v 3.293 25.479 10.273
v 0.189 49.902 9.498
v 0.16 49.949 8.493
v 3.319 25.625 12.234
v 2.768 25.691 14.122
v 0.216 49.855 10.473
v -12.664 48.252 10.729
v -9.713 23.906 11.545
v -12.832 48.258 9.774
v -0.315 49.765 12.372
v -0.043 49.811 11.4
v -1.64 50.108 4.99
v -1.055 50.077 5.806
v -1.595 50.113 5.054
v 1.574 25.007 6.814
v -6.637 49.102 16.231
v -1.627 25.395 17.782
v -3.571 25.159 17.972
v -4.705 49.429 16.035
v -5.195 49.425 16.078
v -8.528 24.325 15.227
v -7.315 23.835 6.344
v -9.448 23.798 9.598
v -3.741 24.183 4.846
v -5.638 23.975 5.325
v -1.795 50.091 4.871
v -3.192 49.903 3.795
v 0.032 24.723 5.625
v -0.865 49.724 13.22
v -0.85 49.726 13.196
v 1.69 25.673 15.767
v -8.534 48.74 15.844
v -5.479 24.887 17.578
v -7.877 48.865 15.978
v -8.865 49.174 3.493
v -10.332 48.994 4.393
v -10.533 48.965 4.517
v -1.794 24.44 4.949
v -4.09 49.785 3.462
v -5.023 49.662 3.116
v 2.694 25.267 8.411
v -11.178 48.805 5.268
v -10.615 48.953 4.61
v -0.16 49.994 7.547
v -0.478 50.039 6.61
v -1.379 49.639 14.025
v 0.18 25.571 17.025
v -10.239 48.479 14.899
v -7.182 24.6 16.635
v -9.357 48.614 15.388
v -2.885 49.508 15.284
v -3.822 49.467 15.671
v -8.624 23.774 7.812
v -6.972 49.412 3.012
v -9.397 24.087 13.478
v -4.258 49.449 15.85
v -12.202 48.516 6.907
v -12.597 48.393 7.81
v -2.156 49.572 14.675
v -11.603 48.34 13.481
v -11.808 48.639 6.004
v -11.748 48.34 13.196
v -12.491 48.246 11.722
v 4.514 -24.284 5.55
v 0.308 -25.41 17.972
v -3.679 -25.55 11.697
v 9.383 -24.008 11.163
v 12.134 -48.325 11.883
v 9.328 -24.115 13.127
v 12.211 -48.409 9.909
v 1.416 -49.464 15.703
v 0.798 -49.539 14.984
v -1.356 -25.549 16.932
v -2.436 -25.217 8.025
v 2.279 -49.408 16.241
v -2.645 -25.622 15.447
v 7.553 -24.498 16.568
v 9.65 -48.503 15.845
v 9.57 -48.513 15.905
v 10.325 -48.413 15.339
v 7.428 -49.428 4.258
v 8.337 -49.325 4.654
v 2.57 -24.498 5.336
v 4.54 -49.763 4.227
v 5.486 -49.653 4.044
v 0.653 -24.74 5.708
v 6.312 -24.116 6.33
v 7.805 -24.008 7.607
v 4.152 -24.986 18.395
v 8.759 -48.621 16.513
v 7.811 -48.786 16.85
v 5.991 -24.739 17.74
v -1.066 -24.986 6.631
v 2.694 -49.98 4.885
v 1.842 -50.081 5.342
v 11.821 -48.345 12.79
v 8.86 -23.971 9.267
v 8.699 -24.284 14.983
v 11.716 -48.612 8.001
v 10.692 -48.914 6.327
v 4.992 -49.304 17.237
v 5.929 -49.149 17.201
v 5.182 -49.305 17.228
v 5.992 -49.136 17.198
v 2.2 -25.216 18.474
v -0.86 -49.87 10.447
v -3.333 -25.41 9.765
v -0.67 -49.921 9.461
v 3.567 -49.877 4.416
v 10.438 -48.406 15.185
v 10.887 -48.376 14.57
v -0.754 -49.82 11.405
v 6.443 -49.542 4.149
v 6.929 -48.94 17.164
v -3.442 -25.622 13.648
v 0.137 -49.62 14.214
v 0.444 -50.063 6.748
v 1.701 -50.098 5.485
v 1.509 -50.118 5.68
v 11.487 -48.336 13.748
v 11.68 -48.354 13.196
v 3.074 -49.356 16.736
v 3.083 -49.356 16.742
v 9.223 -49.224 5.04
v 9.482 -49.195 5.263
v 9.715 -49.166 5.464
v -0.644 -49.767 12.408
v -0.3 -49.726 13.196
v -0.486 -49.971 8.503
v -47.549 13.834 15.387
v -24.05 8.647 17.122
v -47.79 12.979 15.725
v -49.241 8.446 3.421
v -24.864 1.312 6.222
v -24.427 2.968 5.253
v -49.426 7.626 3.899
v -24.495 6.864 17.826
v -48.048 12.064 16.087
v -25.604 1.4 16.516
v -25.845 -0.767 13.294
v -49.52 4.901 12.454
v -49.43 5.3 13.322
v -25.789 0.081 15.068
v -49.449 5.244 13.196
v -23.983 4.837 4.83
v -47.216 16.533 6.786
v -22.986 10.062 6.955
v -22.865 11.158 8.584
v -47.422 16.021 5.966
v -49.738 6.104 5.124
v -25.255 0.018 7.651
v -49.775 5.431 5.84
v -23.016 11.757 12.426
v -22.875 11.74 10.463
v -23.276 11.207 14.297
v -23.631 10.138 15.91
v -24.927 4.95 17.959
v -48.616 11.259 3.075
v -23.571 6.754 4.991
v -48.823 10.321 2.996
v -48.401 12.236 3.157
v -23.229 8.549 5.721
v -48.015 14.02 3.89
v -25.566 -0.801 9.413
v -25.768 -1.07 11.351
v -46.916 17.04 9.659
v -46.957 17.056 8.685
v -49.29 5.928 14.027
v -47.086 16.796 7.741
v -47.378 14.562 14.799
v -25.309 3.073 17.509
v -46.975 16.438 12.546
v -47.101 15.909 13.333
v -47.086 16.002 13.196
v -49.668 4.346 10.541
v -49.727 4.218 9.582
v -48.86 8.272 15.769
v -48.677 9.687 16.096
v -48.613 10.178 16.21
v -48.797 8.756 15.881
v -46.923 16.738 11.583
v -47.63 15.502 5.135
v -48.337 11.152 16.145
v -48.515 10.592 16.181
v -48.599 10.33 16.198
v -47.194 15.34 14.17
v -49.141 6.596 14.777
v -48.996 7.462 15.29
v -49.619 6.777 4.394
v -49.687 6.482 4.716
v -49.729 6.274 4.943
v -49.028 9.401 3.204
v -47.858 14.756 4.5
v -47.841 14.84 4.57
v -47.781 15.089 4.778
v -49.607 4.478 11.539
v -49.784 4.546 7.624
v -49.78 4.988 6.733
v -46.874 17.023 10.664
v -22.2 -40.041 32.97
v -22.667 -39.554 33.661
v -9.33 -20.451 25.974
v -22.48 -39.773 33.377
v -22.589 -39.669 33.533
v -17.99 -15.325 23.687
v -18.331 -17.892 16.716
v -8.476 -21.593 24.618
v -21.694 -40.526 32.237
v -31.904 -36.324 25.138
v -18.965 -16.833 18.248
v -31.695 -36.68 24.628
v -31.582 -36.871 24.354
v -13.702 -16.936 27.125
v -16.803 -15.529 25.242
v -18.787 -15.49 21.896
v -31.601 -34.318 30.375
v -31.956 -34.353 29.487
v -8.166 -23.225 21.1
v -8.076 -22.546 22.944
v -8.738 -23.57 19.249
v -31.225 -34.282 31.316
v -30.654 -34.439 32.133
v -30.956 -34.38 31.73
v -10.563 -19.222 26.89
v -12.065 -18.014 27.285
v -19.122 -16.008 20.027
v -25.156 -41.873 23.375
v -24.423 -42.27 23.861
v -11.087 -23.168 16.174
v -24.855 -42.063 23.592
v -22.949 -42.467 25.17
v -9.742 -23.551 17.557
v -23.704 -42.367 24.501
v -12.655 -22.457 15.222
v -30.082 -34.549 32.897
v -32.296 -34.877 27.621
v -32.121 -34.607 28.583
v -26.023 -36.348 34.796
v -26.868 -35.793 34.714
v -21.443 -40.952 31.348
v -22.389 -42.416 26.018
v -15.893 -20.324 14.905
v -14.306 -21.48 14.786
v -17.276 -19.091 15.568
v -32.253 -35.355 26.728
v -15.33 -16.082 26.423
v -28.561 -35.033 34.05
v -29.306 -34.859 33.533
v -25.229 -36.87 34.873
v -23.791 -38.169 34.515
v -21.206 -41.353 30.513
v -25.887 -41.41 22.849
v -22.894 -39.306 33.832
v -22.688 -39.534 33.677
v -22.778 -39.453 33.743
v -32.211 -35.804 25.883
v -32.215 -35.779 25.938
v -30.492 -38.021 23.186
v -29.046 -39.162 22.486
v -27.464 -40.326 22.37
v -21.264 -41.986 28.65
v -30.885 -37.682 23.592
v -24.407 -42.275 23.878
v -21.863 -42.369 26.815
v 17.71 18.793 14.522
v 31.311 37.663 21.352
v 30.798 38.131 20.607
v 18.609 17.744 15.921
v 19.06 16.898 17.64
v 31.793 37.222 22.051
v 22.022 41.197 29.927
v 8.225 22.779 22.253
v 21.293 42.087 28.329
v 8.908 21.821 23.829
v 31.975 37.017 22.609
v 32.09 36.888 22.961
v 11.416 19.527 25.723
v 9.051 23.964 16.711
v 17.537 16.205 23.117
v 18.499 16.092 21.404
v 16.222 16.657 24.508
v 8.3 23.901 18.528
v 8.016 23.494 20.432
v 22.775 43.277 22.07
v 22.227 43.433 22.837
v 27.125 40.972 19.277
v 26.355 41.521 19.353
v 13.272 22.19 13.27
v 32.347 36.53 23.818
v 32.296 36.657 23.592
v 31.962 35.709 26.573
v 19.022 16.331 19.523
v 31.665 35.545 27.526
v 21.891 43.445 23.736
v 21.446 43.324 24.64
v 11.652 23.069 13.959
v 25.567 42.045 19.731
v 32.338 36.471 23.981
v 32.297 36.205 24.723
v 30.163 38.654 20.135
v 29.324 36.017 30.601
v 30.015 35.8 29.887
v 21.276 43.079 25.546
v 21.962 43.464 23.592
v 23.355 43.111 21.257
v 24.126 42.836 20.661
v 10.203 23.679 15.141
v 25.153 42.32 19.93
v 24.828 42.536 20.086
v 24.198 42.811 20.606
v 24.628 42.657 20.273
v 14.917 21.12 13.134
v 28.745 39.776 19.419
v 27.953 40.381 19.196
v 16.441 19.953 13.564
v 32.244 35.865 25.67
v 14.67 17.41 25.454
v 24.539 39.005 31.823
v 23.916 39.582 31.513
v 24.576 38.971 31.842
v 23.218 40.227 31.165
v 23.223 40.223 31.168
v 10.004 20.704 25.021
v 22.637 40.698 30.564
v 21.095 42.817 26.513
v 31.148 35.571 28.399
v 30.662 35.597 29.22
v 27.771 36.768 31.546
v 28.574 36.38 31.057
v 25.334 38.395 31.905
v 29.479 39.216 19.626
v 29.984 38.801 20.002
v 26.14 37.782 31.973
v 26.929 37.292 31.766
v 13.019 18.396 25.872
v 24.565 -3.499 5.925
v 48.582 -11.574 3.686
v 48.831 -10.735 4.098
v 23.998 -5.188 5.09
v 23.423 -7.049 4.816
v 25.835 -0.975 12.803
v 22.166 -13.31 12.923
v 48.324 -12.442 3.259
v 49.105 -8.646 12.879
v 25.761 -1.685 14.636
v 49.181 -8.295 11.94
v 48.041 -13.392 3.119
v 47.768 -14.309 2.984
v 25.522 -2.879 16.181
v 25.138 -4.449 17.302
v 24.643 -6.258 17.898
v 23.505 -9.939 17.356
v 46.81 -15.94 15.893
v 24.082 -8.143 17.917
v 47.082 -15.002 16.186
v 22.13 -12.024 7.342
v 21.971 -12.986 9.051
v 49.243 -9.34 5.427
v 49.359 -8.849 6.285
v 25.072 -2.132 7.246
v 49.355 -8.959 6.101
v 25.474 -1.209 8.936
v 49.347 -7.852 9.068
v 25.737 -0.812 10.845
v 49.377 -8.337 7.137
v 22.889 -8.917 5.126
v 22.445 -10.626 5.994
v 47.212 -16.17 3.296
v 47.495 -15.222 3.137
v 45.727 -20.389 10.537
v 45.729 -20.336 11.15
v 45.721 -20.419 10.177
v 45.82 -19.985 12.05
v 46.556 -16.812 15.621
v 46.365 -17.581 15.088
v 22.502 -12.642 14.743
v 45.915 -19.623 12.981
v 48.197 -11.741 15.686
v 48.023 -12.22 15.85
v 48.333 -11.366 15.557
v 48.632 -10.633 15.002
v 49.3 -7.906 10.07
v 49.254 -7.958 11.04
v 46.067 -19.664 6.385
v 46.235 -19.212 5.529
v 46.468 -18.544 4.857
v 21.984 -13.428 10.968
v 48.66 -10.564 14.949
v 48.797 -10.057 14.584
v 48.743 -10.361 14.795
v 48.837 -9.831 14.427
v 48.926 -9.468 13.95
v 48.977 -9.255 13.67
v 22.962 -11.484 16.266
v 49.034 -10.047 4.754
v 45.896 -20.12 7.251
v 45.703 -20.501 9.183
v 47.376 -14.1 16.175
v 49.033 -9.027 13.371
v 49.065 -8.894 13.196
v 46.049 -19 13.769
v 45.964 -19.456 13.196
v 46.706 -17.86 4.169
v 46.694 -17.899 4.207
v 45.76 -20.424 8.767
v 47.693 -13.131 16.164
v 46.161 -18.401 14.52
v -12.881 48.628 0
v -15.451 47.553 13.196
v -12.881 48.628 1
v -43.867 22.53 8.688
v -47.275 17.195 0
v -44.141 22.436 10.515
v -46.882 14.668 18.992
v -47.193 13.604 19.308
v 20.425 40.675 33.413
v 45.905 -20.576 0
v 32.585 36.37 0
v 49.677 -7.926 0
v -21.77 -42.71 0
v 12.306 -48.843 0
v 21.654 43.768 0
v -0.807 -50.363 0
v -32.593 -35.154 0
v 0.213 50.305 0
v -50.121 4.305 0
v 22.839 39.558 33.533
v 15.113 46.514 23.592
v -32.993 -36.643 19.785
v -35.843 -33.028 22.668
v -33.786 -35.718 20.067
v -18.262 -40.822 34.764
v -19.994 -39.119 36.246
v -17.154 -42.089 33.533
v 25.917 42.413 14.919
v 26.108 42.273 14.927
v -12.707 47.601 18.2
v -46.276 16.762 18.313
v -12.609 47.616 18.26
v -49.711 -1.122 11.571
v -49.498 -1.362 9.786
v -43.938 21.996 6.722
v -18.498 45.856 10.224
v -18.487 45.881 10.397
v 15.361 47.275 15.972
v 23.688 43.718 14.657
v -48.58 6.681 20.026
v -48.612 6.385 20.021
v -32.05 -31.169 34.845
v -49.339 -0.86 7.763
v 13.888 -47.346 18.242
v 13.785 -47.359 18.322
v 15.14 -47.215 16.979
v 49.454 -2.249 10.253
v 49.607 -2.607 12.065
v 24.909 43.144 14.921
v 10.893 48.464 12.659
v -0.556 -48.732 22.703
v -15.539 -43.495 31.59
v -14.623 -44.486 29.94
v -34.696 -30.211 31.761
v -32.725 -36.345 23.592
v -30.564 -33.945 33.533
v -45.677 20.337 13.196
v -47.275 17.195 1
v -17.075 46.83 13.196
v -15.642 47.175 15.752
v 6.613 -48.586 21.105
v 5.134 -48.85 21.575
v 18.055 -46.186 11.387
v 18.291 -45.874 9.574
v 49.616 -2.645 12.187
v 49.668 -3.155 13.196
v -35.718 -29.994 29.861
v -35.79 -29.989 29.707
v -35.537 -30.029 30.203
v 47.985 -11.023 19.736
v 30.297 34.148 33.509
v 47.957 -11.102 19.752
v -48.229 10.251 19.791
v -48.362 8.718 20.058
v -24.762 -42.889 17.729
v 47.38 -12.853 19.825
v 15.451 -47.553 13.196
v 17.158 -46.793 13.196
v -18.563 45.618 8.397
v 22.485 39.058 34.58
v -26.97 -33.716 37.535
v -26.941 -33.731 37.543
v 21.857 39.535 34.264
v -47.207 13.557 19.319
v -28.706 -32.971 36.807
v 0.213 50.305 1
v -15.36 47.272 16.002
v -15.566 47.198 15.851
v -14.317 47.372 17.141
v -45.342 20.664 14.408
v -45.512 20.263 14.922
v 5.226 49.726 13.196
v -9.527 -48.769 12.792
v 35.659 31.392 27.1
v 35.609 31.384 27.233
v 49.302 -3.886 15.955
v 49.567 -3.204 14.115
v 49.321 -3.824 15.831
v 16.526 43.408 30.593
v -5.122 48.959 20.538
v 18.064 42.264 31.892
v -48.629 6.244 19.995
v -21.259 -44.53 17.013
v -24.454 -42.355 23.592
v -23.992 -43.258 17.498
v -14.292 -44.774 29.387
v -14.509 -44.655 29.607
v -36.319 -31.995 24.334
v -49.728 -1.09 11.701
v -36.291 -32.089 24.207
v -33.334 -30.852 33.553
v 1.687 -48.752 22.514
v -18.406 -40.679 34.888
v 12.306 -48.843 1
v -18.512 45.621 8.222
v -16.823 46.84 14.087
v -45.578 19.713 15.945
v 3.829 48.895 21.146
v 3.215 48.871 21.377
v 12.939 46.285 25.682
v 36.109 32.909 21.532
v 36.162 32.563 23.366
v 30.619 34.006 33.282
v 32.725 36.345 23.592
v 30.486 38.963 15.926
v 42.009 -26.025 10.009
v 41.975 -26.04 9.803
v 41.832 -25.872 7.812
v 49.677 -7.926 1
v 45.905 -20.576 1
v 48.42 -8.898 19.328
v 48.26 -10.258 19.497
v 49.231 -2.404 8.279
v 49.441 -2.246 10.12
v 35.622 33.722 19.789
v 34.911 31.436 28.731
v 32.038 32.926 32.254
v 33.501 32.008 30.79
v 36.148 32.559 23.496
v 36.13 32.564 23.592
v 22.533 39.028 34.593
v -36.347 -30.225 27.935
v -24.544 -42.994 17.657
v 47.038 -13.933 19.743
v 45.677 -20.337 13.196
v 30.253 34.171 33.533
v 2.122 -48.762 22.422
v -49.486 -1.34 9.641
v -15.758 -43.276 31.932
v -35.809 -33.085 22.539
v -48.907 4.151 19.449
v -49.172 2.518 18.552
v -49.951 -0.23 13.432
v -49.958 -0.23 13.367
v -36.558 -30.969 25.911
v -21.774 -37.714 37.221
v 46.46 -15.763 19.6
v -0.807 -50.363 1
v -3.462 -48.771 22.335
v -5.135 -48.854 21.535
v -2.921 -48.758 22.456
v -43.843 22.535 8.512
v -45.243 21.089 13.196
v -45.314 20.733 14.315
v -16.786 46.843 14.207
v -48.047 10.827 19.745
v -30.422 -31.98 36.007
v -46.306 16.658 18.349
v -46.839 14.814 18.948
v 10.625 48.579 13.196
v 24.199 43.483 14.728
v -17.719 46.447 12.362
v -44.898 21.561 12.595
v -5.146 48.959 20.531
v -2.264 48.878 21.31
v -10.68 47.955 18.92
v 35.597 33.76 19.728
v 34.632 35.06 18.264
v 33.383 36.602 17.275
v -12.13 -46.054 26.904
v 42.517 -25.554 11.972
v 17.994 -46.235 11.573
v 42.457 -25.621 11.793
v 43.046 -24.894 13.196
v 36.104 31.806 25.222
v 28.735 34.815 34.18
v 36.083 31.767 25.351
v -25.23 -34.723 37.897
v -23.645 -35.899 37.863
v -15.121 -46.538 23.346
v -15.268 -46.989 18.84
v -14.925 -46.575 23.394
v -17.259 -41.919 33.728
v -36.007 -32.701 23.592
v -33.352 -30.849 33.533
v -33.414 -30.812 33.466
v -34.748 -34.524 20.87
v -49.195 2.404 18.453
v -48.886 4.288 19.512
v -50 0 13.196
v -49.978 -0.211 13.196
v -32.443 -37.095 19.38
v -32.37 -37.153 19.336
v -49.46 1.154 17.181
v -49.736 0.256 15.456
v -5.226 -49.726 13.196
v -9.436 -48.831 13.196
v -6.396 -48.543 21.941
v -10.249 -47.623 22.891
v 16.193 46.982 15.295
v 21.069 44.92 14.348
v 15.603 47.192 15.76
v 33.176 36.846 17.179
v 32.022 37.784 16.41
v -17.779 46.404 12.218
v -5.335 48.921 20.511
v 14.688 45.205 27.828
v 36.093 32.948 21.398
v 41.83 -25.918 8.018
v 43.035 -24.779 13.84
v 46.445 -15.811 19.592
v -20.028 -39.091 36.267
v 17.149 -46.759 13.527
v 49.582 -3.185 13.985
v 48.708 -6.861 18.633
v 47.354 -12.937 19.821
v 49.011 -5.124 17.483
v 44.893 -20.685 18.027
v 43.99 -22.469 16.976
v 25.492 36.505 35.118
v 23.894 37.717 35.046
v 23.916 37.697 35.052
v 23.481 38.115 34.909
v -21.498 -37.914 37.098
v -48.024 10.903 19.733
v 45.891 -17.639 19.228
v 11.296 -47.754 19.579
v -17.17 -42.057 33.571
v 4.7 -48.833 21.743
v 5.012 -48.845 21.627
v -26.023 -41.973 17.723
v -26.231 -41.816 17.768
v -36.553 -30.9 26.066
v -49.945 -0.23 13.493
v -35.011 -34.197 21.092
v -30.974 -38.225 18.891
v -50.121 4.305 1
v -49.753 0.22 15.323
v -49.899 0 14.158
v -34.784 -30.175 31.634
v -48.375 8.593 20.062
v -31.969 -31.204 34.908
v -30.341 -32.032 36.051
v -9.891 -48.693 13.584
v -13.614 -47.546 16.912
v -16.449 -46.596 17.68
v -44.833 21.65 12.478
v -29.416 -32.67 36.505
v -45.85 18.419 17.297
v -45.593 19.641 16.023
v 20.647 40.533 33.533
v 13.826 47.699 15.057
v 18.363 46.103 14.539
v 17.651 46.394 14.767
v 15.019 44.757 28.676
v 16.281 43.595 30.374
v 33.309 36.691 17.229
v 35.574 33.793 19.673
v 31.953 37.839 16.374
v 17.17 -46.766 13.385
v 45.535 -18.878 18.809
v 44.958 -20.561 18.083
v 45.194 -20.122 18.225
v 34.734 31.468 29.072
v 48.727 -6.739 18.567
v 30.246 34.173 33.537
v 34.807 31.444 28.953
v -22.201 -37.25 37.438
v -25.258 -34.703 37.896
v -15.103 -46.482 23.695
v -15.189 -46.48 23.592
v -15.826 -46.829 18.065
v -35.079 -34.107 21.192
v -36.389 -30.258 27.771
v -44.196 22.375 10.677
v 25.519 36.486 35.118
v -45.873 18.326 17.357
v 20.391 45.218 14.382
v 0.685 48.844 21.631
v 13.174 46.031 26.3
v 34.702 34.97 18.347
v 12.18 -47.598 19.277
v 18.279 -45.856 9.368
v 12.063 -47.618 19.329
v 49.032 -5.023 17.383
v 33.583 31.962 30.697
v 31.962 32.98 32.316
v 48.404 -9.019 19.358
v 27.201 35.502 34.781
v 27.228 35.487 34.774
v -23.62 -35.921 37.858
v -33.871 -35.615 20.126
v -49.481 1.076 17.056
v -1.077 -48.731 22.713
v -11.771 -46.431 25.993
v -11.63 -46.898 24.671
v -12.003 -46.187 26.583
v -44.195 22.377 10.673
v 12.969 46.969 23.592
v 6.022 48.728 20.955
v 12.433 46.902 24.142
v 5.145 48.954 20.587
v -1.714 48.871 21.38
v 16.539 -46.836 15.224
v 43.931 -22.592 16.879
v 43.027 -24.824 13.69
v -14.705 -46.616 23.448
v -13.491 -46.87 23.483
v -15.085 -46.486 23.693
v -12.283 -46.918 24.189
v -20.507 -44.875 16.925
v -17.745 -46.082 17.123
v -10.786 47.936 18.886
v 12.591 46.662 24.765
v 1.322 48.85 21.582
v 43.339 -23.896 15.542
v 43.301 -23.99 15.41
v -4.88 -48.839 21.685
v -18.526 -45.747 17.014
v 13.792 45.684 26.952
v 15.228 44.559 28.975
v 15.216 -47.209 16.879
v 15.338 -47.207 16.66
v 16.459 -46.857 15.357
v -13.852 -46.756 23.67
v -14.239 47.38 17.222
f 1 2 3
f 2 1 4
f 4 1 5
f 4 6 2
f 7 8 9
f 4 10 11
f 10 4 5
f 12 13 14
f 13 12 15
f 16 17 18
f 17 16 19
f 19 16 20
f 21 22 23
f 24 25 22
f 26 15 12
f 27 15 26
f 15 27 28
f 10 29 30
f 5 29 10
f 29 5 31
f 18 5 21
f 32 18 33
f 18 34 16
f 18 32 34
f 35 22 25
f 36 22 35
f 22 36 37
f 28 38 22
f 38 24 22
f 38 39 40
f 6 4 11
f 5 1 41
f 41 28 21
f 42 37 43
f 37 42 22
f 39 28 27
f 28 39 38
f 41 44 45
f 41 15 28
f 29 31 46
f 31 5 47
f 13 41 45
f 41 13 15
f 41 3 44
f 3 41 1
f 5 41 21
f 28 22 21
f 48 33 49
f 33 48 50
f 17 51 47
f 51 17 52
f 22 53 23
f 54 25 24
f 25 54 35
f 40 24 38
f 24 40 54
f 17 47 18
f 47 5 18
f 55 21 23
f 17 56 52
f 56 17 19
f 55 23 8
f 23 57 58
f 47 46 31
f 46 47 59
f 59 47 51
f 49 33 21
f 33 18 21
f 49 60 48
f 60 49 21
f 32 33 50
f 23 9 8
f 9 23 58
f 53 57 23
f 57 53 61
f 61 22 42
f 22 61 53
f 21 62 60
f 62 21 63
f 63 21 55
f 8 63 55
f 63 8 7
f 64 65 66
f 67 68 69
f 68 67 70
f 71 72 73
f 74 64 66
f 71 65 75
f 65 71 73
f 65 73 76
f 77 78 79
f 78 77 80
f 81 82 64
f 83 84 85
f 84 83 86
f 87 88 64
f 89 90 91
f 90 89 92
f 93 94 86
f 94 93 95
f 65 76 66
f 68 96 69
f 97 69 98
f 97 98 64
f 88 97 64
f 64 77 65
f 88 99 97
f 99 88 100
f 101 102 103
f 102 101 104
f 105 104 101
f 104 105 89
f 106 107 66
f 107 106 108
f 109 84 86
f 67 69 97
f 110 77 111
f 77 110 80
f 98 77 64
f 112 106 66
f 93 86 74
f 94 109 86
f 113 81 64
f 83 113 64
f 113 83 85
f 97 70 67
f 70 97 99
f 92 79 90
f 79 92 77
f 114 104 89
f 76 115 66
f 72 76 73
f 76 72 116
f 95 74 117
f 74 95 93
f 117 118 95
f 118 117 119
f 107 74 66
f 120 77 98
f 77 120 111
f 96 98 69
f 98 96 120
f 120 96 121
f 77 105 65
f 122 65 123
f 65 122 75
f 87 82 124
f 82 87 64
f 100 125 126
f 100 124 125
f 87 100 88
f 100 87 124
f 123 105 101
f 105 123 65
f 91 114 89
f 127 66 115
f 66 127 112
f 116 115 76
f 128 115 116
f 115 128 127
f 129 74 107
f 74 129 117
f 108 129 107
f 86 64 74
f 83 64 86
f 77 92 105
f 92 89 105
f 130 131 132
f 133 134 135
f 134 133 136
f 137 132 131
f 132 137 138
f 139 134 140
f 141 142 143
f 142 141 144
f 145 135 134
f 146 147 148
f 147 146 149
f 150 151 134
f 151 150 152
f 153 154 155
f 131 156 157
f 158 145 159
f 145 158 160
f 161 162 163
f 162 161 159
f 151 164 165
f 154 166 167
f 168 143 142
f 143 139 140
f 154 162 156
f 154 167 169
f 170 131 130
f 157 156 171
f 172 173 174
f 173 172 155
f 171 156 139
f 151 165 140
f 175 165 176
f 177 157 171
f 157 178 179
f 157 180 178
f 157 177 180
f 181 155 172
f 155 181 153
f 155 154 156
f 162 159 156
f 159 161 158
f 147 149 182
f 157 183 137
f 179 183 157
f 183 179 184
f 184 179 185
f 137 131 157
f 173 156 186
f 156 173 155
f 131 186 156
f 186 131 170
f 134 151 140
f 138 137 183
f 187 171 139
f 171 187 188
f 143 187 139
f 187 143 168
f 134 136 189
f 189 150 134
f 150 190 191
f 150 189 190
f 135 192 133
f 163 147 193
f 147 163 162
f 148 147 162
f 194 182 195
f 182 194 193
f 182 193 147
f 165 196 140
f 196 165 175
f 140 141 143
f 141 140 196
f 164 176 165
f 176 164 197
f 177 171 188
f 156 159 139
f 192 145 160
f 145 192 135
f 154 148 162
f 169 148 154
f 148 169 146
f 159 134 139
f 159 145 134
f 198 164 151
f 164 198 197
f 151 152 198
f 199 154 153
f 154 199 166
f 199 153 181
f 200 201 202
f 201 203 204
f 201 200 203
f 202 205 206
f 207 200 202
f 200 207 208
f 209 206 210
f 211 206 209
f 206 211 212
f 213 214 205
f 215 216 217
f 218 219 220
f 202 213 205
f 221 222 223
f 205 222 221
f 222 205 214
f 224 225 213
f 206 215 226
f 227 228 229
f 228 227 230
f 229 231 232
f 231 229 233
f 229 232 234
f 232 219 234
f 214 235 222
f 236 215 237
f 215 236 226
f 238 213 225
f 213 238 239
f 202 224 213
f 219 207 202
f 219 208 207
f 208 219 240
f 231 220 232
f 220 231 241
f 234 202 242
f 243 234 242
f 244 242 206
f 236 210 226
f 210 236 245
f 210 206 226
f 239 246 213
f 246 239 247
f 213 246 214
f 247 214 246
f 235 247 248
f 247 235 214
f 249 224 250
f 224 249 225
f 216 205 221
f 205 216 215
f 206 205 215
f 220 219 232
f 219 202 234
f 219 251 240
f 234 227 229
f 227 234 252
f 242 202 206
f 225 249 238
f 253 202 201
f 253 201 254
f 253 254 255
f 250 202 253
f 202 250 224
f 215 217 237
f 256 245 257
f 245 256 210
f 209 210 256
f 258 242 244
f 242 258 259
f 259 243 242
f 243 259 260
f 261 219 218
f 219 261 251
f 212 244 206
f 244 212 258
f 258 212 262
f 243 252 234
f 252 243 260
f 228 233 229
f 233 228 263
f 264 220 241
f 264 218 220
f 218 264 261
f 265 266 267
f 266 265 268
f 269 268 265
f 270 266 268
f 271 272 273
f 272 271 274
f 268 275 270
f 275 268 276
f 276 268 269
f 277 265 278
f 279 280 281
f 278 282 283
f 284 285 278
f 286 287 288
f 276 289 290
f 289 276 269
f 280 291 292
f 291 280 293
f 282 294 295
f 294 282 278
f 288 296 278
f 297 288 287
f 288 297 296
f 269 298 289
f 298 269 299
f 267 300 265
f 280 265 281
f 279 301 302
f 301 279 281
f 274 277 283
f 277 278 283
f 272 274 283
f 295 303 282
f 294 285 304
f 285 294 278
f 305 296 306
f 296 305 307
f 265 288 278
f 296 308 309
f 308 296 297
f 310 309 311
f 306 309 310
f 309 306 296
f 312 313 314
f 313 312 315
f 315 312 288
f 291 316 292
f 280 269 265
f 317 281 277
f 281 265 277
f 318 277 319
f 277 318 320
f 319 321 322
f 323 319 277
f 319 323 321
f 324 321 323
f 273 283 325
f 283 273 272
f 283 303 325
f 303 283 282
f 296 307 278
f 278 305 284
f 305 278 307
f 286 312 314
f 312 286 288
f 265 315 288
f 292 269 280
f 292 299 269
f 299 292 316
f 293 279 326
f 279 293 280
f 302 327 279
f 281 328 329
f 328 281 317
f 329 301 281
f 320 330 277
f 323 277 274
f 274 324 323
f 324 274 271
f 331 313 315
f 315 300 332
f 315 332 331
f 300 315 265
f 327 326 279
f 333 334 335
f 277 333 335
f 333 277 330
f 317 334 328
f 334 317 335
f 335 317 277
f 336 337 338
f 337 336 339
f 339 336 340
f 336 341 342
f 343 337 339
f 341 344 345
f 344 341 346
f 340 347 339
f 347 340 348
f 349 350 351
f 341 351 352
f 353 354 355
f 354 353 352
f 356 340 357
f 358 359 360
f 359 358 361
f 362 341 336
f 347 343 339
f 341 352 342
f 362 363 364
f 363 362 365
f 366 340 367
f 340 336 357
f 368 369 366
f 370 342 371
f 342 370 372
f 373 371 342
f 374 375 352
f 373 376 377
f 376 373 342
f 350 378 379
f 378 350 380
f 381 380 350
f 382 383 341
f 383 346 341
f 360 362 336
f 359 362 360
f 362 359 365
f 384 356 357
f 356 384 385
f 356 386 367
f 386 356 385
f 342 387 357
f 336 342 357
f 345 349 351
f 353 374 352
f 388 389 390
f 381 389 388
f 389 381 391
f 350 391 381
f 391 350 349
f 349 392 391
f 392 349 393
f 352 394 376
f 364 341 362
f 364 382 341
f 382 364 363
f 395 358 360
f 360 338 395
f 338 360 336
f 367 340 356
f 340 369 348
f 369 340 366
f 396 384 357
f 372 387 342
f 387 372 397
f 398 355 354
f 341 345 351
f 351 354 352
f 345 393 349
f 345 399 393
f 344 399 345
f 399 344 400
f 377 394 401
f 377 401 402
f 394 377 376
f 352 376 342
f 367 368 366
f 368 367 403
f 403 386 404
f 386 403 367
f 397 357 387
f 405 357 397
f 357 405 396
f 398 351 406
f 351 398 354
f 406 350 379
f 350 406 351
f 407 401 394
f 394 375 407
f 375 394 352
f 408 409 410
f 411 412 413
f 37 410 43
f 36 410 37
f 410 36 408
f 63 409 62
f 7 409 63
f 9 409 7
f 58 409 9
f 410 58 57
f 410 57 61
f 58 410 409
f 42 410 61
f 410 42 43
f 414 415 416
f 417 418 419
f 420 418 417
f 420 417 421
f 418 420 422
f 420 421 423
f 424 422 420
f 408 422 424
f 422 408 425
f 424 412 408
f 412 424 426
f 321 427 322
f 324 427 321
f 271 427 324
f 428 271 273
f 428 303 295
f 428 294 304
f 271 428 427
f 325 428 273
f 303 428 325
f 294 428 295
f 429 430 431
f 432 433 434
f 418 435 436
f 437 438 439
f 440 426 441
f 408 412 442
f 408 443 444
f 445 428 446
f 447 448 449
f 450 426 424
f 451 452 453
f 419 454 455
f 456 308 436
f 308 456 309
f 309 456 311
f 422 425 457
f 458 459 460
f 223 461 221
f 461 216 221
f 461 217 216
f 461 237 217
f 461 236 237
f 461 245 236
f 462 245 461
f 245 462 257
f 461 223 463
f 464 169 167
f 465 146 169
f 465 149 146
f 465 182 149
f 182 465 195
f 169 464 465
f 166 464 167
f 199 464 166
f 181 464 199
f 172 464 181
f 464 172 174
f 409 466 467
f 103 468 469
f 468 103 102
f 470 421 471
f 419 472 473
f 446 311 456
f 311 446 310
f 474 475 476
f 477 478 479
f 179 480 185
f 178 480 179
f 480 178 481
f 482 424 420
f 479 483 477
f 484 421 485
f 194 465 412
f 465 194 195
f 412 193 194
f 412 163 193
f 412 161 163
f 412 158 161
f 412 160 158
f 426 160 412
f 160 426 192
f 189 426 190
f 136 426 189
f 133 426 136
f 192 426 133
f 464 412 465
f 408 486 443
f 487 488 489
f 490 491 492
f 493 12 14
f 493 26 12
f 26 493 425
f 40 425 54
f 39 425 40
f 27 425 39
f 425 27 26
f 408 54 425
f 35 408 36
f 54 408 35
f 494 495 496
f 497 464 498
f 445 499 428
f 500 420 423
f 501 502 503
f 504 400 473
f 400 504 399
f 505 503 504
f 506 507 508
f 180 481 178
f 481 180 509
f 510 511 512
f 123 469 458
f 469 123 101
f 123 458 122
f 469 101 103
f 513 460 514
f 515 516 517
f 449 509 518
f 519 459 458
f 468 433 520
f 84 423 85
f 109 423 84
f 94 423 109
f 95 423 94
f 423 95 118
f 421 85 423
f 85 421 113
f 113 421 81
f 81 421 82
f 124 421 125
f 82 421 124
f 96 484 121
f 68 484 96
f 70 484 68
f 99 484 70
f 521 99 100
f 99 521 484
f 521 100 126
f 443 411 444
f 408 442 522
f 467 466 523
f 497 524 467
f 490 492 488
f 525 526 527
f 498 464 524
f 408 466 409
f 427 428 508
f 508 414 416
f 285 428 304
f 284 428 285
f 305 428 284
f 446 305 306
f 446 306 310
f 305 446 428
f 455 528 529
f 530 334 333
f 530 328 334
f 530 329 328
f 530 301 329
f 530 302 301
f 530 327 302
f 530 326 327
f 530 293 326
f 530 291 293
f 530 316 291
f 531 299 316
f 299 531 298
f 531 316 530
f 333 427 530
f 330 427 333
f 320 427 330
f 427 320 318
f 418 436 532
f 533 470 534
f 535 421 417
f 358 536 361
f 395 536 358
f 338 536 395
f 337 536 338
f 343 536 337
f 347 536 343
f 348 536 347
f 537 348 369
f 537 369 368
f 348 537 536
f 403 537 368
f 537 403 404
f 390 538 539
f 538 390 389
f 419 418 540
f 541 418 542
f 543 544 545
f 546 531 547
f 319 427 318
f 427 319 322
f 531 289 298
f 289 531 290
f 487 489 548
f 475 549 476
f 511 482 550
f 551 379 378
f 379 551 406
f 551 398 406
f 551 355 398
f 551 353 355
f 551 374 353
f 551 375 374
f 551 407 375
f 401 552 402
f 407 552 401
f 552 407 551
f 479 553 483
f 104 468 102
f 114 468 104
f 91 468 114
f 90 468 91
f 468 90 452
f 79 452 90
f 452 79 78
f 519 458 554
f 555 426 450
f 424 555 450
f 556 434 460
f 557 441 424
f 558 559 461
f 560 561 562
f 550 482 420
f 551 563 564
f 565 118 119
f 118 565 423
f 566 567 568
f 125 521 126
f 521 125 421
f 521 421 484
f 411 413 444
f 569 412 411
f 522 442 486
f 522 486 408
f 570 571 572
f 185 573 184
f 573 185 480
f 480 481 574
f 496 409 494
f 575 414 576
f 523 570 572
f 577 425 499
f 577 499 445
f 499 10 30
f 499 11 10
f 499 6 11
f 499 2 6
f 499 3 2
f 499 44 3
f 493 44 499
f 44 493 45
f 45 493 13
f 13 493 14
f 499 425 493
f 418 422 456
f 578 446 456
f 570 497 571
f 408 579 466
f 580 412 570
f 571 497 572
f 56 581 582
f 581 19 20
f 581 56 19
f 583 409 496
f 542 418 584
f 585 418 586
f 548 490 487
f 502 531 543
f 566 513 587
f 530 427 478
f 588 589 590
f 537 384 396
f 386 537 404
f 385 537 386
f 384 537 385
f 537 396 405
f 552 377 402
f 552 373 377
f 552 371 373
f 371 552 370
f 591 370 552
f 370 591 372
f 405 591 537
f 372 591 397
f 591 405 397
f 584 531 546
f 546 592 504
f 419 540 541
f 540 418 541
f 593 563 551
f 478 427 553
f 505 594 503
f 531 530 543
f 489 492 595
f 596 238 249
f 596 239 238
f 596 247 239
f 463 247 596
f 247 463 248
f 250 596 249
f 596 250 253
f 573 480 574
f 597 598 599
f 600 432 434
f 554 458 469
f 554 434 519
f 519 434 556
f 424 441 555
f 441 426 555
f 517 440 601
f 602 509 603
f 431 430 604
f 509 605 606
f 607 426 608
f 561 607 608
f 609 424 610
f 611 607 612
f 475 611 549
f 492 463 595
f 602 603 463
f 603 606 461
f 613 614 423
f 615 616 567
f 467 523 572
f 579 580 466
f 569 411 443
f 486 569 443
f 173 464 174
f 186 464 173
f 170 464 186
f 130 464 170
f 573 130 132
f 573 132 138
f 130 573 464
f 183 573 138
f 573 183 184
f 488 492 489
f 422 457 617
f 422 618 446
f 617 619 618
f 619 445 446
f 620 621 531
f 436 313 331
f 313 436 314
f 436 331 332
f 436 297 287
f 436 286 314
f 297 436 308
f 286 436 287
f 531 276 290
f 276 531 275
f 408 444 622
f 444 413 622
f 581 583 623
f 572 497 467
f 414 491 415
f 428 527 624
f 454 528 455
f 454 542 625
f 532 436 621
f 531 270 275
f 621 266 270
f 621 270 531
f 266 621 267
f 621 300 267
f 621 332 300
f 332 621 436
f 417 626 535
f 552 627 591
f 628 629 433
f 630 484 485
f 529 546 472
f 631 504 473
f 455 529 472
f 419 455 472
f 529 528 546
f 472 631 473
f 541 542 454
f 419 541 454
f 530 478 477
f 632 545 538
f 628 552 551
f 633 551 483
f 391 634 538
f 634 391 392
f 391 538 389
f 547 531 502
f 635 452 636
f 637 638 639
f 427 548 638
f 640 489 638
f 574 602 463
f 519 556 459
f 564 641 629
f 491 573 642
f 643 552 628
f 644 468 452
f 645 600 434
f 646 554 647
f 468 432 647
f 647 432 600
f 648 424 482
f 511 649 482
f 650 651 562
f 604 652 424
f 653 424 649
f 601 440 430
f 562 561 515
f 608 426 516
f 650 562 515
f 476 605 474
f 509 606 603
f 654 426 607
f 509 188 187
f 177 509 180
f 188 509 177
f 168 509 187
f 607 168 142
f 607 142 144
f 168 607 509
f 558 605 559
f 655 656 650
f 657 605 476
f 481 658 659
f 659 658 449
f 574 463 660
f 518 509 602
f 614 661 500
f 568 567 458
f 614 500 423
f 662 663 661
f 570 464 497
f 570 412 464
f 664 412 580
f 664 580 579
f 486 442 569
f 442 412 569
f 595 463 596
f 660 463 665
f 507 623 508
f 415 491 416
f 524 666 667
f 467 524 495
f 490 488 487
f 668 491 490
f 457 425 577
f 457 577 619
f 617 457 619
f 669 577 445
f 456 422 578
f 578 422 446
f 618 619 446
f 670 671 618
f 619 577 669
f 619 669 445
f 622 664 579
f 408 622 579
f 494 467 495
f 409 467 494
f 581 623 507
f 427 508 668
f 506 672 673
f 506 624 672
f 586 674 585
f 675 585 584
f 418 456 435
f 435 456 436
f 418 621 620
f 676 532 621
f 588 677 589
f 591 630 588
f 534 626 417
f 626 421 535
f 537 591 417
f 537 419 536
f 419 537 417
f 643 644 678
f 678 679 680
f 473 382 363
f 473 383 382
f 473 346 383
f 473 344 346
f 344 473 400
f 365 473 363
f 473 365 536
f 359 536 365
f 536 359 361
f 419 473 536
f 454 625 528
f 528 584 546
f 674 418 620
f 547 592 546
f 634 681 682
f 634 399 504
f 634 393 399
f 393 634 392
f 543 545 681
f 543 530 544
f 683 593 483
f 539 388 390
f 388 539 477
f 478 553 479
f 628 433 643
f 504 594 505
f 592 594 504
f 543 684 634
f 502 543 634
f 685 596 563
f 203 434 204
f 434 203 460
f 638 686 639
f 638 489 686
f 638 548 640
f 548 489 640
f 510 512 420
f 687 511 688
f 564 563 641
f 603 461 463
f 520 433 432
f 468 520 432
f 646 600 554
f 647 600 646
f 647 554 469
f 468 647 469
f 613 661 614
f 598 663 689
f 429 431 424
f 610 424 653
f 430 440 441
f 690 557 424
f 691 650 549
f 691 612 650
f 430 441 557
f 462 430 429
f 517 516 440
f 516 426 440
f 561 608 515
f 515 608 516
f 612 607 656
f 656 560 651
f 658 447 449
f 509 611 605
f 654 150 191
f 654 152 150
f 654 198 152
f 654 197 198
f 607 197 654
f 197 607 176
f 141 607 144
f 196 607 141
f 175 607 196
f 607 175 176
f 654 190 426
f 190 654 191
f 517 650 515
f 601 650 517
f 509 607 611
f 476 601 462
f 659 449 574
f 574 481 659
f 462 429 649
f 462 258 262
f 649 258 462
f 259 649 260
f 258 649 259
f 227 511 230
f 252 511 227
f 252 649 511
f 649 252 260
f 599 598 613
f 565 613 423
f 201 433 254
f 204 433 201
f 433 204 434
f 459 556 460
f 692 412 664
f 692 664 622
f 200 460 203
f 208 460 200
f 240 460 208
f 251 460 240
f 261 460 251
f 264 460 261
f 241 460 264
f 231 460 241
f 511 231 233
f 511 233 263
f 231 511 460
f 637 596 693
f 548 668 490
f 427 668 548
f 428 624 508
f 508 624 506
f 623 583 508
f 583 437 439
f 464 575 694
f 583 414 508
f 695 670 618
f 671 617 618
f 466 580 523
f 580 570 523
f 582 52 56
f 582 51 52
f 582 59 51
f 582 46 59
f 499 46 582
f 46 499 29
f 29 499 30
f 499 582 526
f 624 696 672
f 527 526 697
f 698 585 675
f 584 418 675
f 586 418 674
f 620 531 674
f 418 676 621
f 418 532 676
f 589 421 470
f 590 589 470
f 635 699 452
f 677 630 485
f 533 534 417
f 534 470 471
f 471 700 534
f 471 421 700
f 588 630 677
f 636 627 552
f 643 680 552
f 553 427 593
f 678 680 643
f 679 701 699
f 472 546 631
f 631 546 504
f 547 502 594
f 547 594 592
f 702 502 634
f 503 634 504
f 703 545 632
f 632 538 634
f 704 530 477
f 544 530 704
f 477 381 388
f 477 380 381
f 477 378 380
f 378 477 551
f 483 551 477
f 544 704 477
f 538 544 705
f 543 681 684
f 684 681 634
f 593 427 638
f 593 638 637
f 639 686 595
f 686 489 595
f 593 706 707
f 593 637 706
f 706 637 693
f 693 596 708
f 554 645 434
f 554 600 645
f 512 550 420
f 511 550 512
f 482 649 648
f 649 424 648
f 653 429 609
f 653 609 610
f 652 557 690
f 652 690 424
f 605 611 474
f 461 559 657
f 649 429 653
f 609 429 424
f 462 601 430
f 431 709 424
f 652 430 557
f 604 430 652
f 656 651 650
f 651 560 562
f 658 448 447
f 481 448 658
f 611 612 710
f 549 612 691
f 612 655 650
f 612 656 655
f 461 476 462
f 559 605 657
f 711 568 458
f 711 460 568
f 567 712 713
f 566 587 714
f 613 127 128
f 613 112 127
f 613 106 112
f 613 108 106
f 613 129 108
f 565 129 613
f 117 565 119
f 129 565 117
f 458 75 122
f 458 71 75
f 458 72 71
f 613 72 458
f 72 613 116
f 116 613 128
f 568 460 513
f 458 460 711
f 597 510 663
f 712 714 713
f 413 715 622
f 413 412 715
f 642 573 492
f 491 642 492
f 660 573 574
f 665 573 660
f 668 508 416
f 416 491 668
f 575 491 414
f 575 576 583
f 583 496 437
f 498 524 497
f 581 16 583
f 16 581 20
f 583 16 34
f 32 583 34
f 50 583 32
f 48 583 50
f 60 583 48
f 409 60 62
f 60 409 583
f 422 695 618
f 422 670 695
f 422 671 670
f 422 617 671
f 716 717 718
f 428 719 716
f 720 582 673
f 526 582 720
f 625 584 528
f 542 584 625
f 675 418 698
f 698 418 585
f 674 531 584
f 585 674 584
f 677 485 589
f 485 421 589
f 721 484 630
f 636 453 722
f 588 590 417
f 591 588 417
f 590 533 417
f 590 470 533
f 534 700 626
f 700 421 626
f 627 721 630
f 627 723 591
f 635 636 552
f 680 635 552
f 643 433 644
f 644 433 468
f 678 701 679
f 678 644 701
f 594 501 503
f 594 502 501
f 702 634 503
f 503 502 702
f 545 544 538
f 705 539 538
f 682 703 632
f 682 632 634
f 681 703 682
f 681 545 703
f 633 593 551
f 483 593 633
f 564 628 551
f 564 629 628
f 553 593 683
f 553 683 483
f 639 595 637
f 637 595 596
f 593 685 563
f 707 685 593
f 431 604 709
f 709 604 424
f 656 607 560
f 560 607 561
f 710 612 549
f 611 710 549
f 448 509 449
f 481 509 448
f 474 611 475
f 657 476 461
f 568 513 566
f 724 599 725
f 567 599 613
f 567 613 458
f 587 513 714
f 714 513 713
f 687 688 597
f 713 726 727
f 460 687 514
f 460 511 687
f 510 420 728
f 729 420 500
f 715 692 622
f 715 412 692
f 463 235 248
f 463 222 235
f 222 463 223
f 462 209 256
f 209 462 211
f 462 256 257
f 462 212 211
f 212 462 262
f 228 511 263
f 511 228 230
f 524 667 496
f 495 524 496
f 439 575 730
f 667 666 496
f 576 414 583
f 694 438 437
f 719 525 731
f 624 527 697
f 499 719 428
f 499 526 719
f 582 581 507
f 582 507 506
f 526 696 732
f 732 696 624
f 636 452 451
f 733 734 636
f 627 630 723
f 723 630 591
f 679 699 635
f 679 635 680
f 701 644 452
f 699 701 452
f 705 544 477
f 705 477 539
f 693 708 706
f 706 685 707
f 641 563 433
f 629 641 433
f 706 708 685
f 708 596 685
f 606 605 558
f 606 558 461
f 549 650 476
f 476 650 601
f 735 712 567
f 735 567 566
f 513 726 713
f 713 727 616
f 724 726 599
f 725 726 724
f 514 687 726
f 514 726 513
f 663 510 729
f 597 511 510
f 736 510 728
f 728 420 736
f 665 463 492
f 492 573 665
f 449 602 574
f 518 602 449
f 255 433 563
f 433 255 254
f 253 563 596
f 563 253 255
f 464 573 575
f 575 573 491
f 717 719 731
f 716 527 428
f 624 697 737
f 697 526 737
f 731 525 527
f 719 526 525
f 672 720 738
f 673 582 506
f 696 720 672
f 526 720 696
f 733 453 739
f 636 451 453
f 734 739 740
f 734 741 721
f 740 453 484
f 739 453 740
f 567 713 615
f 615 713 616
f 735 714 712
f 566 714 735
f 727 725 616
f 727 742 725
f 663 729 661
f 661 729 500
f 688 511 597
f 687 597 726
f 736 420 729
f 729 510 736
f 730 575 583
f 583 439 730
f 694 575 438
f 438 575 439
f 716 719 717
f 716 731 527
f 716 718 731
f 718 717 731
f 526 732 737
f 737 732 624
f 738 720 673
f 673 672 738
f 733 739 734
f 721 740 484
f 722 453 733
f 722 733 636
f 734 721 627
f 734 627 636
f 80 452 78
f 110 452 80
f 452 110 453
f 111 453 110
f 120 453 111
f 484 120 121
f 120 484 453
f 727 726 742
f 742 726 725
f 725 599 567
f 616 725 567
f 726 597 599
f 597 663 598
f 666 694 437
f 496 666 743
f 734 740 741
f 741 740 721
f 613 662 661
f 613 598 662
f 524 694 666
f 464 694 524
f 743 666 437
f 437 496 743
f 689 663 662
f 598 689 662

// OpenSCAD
difference() {
	hull() {
		union() {
			union() {
				rotate(a = 97.2967834620, v = [0, 0, 1]) {
					translate(v = [0, -6.6000000000, 0]) {
						cube(size = [49.8704971461, 13.2000000000, 1]);
					}
				}
				rotate(a = -83.3882061464, v = [0, 0, 1]) {
					translate(v = [0, -6.6000000000, 0]) {
						cube(size = [49.9350069949, 13.2000000000, 1]);
					}
				}
				rotate(a = 167.5515173589, v = [0, 0, 1]) {
					translate(v = [0, -6.6000000000, 0]) {
						cube(size = [49.8704965614, 13.2000000000, 1]);
					}
				}
				rotate(a = -124.9216089764, v = [0, 0, 1]) {
					translate(v = [0, -6.6000000000, 0]) {
						cube(size = [47.4817863111, 13.2000000000, 1]);
					}
				}
				rotate(a = 55.9091917115, v = [0, 0, 1]) {
					translate(v = [0, -6.6000000000, 0]) {
						cube(size = [48.3838378507, 13.2000000000, 1]);
					}
				}
				rotate(a = -16.6039442882, v = [0, 0, 1]) {
					translate(v = [0, -6.6000000000, 0]) {
						cube(size = [49.8704970770, 13.2000000000, 1]);
					}
				}
			}
			translate(v = [0, 0, 13.1963618239]) {
				intersection() {
					hull() {
						rotate(a = 94.1245907331, v = [-0.9893325646, -0.1266798920, 0.0000011160]) {
							cylinder(h = 50, r = 9.6000000000);
						}
						rotate(a = 92.9217326328, v = [0.9920578199, 0.1149920084, -0.0000011070]) {
							cylinder(h = 50, r = 9.6000000000);
						}
						rotate(a = 94.1246932011, v = [-0.2150034447, -0.9739609748, 0.0000011890]) {
							cylinder(h = 50, r = 9.6000000000);
						}
						rotate(a = 71.7384838121, v = [0.7786408645, -0.5436241766, -0.0000002350]) {
							cylinder(h = 50, r = 9.6000000000);
						}
						rotate(a = 75.3925546191, v = [-0.8013815104, 0.5423885167, 0.0000002590]) {
							cylinder(h = 50, r = 9.6000000000);
						}
						rotate(a = 94.1246028557, v = [0.2850141461, 0.9558209166, -0.0000012408]) {
							cylinder(h = 50, r = 9.6000000000);
						}
					}
					sphere(r = 50);
				}
			}
		}
	}
	translate(v = [0, 0, 13.1963618239]) {
		rotate(a = 94.1245907331, v = [-0.9893325646, -0.1266798920, 0.0000011160]) {
			translate(v = [0, 0, 25]) {
				cylinder(h = 50, r = 6.6000000000);
			}
		}
		rotate(a = 92.9217326328, v = [0.9920578199, 0.1149920084, -0.0000011070]) {
			translate(v = [0, 0, 25]) {
				cylinder(h = 50, r = 6.6000000000);
			}
		}
		rotate(a = 94.1246932011, v = [-0.2150034447, -0.9739609748, 0.0000011890]) {
			translate(v = [0, 0, 25]) {
				cylinder(h = 50, r = 6.6000000000);
			}
		}
		rotate(a = 71.7384838121, v = [0.7786408645, -0.5436241766, -0.0000002350]) {
			translate(v = [0, 0, 25]) {
				cylinder(h = 50, r = 6.6000000000);
			}
		}
		rotate(a = 75.3925546191, v = [-0.8013815104, 0.5423885167, 0.0000002590]) {
			translate(v = [0, 0, 25]) {
				cylinder(h = 50, r = 6.6000000000);
			}
		}
		rotate(a = 94.1246028557, v = [0.2850141461, 0.9558209166, -0.0000012408]) {
			translate(v = [0, 0, 25]) {
				cylinder(h = 50, r = 6.6000000000);
			}
		}
	}
}
